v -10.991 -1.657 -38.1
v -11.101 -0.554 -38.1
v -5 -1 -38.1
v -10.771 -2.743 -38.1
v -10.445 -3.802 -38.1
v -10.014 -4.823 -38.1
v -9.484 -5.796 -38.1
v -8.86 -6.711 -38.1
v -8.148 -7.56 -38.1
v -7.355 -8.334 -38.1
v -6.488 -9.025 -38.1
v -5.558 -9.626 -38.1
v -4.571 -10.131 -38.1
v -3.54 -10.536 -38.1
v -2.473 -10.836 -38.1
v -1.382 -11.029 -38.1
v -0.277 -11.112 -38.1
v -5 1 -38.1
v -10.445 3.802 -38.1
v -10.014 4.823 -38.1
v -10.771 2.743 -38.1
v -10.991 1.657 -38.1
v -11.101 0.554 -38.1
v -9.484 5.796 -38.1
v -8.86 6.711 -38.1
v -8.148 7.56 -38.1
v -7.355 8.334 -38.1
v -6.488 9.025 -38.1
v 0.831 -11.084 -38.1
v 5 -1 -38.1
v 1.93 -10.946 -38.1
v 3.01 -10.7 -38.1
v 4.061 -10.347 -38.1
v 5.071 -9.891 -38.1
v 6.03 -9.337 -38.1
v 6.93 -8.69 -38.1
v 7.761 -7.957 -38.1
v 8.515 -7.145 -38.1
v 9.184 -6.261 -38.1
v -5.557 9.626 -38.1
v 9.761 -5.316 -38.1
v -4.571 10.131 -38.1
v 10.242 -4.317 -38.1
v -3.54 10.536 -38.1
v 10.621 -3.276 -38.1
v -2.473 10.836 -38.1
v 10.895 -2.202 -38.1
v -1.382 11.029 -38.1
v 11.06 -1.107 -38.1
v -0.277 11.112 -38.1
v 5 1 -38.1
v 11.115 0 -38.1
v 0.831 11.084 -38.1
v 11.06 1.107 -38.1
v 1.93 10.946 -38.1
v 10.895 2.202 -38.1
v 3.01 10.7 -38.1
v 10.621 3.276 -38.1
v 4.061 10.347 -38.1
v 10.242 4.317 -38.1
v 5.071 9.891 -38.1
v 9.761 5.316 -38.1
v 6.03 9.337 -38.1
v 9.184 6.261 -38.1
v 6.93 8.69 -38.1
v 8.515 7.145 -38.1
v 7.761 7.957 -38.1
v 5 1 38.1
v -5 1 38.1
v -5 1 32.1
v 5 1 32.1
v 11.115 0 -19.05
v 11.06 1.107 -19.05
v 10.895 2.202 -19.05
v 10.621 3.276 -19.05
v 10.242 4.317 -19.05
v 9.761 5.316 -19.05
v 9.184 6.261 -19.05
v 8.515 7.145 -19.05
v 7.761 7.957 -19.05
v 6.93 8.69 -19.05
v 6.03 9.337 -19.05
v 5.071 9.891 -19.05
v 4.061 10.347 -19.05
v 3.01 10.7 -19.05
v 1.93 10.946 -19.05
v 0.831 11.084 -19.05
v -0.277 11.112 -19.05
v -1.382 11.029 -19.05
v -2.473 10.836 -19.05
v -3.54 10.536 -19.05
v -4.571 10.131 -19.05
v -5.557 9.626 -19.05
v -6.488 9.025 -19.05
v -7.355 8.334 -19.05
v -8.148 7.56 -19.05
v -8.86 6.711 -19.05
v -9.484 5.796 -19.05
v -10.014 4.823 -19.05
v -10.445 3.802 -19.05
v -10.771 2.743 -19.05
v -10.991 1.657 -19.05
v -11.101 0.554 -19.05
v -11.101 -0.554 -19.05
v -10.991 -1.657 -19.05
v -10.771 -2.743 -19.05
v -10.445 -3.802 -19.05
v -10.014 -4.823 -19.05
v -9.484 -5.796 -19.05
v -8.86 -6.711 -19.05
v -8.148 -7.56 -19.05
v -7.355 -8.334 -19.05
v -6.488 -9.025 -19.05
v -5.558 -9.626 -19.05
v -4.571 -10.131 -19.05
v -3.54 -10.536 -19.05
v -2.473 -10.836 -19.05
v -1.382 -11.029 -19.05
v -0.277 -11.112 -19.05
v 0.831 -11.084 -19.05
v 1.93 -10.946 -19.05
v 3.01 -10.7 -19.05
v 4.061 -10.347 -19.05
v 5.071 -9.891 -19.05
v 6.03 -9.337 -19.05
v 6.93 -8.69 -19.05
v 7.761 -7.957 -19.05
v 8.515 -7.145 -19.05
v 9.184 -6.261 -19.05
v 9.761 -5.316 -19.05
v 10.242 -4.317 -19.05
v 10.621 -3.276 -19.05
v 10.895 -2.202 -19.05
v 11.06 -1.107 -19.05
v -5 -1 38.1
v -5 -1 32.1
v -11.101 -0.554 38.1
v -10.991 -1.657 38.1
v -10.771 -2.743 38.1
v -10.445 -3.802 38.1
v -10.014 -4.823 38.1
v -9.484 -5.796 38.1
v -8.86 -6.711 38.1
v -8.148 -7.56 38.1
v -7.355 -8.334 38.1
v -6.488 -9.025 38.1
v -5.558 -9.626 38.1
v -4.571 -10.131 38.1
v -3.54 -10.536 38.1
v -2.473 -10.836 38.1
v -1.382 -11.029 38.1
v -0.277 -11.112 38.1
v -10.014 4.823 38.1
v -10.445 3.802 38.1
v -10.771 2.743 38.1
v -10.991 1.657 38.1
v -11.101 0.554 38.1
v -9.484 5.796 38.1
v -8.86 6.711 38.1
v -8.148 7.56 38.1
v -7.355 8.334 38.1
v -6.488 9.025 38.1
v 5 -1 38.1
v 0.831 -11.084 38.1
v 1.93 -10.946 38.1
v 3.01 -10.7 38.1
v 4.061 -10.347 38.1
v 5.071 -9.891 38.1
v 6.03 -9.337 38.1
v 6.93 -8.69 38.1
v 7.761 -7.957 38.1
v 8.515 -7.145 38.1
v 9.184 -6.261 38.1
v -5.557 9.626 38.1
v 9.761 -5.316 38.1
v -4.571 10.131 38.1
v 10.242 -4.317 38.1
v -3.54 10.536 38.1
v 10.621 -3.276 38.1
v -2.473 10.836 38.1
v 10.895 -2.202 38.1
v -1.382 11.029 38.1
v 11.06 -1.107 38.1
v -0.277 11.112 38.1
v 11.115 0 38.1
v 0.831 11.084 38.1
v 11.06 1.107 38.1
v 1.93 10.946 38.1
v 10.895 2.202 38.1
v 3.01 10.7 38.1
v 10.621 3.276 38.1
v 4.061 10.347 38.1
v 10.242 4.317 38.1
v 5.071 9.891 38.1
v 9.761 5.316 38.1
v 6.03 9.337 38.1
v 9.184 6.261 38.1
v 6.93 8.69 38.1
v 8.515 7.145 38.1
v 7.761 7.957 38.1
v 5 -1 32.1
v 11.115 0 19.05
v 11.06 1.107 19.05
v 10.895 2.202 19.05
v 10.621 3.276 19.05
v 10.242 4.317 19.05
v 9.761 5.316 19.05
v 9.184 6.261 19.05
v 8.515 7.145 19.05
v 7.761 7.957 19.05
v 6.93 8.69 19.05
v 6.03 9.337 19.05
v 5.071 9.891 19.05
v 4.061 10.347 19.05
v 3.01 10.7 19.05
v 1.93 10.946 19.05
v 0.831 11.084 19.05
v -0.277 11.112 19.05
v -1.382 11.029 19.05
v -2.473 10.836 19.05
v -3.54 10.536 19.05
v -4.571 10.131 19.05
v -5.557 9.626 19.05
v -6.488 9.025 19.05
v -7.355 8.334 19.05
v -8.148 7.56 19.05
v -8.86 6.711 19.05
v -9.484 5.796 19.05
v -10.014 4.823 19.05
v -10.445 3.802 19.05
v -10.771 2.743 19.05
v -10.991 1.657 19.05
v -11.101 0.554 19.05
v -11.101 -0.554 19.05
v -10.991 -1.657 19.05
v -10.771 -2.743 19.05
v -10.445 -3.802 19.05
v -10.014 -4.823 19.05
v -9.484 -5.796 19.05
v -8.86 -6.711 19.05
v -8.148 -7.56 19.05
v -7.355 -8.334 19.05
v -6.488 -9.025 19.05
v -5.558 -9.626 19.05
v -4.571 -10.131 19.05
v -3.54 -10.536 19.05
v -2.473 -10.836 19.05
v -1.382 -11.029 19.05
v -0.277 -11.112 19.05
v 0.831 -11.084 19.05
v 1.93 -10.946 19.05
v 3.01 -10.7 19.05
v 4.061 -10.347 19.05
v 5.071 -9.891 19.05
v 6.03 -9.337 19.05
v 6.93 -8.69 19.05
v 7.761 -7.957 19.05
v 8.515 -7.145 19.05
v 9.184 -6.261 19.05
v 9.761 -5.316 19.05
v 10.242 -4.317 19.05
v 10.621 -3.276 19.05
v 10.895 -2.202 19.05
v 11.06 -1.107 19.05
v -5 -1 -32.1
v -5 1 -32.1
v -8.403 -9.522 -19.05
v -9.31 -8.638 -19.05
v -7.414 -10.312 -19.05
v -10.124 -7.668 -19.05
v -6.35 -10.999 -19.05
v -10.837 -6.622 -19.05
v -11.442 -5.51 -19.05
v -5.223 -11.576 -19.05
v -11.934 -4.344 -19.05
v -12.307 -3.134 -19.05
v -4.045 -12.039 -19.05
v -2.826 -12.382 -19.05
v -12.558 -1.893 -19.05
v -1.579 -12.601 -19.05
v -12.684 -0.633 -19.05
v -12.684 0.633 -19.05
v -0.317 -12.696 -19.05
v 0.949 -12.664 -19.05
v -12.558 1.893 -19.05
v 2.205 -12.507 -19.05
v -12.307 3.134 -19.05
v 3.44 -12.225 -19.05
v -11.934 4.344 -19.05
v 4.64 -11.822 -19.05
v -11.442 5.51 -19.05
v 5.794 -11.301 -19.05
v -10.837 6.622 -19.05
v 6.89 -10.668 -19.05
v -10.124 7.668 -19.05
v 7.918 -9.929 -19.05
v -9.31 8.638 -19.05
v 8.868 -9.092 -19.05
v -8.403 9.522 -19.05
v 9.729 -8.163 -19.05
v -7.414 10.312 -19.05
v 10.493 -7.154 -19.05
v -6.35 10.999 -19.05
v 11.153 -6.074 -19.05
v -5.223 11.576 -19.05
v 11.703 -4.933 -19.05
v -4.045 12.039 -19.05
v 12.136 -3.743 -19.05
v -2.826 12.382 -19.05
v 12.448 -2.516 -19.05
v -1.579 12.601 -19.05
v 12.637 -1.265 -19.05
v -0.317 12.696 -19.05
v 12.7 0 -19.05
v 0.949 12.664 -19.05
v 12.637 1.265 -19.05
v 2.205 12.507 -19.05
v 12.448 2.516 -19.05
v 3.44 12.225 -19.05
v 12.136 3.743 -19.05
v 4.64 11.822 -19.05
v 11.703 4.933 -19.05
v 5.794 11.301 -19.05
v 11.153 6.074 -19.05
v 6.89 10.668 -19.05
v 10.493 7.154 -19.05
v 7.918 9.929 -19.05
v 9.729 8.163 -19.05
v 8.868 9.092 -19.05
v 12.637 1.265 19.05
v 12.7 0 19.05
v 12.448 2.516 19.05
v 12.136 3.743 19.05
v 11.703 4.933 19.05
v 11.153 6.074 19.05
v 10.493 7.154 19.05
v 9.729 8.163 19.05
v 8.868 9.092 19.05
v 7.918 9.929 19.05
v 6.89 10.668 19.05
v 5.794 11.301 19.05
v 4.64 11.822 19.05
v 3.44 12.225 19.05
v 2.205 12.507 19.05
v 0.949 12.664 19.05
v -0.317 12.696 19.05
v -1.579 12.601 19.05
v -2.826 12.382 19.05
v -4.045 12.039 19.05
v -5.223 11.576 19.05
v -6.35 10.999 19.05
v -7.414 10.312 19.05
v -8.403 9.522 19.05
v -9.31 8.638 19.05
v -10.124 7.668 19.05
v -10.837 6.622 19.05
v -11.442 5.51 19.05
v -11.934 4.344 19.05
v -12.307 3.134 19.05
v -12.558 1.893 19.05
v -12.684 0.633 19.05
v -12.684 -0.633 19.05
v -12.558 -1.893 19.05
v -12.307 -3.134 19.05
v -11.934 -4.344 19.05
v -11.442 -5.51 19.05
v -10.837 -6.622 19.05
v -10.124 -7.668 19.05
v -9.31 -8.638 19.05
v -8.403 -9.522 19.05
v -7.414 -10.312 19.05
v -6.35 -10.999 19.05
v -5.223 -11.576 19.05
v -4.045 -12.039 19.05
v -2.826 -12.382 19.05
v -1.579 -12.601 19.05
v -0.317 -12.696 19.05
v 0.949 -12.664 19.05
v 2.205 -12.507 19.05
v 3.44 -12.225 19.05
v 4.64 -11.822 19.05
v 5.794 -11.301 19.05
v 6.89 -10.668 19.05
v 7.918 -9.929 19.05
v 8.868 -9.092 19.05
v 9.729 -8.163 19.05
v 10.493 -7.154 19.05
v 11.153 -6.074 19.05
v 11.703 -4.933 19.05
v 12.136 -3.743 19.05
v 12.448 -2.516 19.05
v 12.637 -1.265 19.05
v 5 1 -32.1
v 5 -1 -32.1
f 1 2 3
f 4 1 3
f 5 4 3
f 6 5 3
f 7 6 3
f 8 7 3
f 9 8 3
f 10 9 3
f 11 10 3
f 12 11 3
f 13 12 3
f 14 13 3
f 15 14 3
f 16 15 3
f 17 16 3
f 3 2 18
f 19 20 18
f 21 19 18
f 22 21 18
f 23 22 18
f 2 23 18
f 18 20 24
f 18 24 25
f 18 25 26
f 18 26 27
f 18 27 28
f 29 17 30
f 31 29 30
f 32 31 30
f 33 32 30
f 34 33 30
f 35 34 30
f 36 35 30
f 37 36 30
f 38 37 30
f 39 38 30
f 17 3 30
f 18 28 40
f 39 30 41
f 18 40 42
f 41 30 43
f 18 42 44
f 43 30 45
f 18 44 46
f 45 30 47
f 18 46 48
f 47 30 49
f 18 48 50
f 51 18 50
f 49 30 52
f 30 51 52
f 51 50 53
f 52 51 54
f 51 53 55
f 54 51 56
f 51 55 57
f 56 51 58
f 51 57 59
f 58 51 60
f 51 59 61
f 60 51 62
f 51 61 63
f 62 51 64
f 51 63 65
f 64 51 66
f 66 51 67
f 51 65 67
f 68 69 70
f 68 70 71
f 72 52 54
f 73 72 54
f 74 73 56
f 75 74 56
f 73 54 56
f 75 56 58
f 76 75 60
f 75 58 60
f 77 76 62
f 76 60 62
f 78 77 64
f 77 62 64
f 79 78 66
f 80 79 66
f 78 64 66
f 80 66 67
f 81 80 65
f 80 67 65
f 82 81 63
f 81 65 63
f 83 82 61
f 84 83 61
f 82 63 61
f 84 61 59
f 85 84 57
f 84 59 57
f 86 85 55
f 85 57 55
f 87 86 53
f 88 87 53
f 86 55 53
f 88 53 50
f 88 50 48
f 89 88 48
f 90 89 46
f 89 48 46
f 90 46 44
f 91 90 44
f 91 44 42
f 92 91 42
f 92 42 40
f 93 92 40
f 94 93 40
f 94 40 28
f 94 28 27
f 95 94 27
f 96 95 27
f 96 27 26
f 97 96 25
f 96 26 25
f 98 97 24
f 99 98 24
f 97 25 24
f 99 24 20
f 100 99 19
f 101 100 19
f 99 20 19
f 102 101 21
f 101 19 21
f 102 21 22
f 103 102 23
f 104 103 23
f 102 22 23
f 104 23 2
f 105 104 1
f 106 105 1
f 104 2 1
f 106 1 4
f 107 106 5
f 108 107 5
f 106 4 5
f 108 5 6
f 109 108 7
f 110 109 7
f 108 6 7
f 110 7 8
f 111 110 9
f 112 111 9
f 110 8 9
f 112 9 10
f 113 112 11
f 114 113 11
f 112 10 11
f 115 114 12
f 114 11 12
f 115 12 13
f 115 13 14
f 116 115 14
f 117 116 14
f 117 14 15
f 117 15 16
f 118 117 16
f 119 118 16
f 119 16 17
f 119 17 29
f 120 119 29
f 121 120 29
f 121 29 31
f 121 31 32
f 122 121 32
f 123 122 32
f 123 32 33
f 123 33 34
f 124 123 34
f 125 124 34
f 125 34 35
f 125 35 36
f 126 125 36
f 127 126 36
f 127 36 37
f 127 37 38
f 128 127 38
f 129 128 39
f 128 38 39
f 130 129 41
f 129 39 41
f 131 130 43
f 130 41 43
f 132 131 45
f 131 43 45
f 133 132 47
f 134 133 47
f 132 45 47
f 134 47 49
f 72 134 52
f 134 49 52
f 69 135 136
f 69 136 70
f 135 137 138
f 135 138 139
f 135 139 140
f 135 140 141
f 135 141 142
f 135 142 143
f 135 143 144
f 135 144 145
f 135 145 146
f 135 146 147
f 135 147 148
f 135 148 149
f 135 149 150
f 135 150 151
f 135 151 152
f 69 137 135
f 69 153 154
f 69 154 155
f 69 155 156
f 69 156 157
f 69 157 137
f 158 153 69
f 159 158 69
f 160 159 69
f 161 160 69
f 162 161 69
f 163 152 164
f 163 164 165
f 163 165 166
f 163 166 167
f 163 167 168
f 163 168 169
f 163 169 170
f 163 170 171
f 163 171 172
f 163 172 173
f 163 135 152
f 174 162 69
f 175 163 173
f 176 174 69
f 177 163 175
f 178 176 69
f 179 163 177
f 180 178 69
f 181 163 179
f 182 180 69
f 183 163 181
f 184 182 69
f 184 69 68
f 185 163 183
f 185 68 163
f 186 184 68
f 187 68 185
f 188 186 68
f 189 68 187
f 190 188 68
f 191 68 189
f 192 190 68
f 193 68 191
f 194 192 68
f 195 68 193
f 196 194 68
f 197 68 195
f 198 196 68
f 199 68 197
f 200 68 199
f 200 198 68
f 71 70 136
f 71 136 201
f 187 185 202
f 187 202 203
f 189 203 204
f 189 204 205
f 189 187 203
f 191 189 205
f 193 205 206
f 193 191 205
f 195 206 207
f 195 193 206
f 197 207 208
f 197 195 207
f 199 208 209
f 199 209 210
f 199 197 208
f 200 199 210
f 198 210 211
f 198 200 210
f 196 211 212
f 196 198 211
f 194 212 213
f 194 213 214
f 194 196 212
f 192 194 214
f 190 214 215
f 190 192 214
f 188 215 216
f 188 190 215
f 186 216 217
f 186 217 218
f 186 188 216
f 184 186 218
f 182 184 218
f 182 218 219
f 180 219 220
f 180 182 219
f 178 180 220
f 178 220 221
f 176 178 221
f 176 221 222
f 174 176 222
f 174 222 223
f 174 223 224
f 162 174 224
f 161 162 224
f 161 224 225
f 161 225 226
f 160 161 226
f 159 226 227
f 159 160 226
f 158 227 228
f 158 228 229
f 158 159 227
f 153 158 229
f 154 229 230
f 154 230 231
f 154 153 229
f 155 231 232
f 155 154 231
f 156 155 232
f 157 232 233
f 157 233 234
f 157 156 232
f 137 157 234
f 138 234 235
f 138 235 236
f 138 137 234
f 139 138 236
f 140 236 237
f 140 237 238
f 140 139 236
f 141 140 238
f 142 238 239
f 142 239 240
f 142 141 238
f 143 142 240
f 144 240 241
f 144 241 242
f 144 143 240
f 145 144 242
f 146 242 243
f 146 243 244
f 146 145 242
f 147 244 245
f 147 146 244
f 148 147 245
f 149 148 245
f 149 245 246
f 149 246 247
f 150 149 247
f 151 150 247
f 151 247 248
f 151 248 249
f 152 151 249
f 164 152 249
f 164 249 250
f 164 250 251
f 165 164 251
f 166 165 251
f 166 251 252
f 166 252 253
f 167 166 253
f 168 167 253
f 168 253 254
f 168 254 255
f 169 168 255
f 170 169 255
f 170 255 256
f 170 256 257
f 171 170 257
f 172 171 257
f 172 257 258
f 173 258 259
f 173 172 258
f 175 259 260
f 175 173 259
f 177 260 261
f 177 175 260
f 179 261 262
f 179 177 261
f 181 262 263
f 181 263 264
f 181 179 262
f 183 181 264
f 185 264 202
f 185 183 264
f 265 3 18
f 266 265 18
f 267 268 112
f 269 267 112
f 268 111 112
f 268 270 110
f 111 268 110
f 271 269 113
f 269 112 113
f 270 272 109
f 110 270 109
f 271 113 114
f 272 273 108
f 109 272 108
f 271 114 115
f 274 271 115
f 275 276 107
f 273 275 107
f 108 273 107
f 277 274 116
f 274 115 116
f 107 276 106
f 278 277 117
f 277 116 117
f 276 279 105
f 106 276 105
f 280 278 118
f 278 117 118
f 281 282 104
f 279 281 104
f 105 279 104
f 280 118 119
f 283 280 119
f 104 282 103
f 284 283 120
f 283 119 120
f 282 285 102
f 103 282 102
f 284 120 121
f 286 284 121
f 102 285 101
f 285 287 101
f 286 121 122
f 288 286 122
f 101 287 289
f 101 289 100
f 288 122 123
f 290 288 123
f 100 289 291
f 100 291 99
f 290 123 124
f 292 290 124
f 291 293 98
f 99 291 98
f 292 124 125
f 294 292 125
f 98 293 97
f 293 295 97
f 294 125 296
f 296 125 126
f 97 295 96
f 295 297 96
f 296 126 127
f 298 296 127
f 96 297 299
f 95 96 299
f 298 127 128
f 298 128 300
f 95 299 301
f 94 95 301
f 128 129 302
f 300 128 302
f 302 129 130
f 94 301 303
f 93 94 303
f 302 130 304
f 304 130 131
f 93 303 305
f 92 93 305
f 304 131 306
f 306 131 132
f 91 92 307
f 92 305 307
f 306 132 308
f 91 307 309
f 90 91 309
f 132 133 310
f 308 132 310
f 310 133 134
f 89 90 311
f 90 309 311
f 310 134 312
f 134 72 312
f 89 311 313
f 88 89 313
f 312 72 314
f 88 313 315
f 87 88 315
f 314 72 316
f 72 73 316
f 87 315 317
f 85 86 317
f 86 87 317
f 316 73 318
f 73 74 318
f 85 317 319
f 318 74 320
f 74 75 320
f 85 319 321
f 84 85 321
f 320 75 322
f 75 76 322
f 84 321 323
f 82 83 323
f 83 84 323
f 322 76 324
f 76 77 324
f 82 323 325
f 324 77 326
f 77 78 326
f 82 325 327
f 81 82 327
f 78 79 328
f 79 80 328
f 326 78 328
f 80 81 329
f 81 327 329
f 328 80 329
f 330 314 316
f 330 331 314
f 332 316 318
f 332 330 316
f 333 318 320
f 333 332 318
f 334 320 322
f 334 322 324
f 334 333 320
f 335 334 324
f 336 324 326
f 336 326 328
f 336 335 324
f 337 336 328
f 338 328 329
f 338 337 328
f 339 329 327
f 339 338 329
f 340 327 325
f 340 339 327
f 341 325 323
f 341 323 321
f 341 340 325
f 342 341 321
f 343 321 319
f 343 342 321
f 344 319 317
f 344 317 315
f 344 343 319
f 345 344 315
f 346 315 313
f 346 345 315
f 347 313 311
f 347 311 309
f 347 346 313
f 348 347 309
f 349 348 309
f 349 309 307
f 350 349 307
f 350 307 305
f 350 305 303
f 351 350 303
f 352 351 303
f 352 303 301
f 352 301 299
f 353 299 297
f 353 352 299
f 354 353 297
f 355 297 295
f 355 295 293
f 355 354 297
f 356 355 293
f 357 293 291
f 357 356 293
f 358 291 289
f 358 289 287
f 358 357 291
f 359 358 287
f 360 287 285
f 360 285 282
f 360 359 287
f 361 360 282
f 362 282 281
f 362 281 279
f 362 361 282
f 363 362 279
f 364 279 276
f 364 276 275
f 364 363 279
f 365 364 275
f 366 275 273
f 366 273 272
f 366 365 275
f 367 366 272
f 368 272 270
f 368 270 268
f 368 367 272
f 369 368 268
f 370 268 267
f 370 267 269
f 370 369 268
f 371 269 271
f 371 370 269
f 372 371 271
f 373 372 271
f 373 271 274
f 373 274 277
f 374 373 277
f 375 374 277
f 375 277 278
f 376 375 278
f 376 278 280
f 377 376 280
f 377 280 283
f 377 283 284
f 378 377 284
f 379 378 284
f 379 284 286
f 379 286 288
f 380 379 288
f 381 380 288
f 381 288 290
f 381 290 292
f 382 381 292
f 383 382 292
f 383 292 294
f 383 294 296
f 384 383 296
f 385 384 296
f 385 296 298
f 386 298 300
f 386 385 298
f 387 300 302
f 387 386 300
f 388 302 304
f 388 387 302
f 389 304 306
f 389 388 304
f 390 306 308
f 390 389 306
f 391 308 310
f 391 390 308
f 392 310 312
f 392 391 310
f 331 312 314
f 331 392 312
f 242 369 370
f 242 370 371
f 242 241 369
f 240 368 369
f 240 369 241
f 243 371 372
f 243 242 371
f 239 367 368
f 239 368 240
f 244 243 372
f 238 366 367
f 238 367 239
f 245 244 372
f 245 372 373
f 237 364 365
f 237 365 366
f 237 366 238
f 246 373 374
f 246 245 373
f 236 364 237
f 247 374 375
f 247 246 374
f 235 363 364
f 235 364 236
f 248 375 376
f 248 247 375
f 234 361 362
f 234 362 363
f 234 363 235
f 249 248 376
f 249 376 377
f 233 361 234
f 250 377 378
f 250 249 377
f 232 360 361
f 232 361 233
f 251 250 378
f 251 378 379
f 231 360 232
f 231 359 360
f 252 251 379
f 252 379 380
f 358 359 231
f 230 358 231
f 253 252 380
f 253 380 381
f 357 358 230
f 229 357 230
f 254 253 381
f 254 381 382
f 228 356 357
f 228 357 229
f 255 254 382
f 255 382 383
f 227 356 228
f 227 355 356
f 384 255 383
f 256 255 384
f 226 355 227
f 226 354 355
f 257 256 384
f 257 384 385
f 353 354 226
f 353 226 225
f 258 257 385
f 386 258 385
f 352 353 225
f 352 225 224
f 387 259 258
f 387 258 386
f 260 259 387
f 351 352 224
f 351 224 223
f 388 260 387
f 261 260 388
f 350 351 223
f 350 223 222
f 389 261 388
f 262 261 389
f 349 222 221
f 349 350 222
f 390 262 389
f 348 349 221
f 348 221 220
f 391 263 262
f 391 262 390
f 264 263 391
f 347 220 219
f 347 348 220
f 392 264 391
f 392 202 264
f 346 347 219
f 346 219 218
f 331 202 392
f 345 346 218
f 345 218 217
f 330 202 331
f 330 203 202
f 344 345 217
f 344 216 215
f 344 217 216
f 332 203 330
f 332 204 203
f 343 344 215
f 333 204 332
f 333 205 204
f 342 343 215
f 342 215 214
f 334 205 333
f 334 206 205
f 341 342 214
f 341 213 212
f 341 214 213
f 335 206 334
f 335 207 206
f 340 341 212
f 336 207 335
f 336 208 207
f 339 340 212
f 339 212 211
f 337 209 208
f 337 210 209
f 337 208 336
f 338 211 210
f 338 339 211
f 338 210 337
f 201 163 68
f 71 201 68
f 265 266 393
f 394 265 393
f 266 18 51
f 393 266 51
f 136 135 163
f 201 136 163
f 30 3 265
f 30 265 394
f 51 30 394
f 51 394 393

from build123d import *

# Parameters (mm, degrees)
SKETCH1_R                              = 12.7
BASE_EXTRUDE_DEPTH                     = 38.1
SKETCH2_R                              = 12.7
SKETCH2_R_2                            = 11.115
CUT_EXTRUDE1_DEPTH                     = 19.05
SKETCH3_W                              = 10
SKETCH3_H                              = 2
SLOT_FOR_FLAT_BLADE_SCREW_DRIVER_DEPTH = 6


with BuildPart() as part:
    # Sketch1 → Base-Extrude (new body, symmetric)
    with BuildSketch(Plane.XY):
        Circle(SKETCH1_R)
    extrude(amount=BASE_EXTRUDE_DEPTH, both=True)

    # Sketch2 → Cut-Extrude1 (cut)
    with BuildSketch(Plane.XY.offset(38.1)):
        Circle(SKETCH2_R)
        Circle(SKETCH2_R_2, mode=Mode.SUBTRACT)
    cut_extrude1 = extrude(amount=-CUT_EXTRUDE1_DEPTH, mode=Mode.SUBTRACT)

    # Mirror1: Cut-Extrude1 across plane
    add(cut_extrude1.mirror(Plane.XY), mode=Mode.SUBTRACT)

    # Sketch3 → Slot for Flat Blade Screw Driver (cut)
    with BuildSketch(Plane.XY.offset(38.1)):
        Rectangle(SKETCH3_W, SKETCH3_H)
    slot_for_flat_blade_screw_driver = extrude(amount=-SLOT_FOR_FLAT_BLADE_SCREW_DRIVER_DEPTH, mode=Mode.SUBTRACT)

    # Mirror2: Slot for Flat Blade Screw Driver across plane
    add(slot_for_flat_blade_screw_driver.mirror(Plane.XY), mode=Mode.SUBTRACT)


solid = part.part
